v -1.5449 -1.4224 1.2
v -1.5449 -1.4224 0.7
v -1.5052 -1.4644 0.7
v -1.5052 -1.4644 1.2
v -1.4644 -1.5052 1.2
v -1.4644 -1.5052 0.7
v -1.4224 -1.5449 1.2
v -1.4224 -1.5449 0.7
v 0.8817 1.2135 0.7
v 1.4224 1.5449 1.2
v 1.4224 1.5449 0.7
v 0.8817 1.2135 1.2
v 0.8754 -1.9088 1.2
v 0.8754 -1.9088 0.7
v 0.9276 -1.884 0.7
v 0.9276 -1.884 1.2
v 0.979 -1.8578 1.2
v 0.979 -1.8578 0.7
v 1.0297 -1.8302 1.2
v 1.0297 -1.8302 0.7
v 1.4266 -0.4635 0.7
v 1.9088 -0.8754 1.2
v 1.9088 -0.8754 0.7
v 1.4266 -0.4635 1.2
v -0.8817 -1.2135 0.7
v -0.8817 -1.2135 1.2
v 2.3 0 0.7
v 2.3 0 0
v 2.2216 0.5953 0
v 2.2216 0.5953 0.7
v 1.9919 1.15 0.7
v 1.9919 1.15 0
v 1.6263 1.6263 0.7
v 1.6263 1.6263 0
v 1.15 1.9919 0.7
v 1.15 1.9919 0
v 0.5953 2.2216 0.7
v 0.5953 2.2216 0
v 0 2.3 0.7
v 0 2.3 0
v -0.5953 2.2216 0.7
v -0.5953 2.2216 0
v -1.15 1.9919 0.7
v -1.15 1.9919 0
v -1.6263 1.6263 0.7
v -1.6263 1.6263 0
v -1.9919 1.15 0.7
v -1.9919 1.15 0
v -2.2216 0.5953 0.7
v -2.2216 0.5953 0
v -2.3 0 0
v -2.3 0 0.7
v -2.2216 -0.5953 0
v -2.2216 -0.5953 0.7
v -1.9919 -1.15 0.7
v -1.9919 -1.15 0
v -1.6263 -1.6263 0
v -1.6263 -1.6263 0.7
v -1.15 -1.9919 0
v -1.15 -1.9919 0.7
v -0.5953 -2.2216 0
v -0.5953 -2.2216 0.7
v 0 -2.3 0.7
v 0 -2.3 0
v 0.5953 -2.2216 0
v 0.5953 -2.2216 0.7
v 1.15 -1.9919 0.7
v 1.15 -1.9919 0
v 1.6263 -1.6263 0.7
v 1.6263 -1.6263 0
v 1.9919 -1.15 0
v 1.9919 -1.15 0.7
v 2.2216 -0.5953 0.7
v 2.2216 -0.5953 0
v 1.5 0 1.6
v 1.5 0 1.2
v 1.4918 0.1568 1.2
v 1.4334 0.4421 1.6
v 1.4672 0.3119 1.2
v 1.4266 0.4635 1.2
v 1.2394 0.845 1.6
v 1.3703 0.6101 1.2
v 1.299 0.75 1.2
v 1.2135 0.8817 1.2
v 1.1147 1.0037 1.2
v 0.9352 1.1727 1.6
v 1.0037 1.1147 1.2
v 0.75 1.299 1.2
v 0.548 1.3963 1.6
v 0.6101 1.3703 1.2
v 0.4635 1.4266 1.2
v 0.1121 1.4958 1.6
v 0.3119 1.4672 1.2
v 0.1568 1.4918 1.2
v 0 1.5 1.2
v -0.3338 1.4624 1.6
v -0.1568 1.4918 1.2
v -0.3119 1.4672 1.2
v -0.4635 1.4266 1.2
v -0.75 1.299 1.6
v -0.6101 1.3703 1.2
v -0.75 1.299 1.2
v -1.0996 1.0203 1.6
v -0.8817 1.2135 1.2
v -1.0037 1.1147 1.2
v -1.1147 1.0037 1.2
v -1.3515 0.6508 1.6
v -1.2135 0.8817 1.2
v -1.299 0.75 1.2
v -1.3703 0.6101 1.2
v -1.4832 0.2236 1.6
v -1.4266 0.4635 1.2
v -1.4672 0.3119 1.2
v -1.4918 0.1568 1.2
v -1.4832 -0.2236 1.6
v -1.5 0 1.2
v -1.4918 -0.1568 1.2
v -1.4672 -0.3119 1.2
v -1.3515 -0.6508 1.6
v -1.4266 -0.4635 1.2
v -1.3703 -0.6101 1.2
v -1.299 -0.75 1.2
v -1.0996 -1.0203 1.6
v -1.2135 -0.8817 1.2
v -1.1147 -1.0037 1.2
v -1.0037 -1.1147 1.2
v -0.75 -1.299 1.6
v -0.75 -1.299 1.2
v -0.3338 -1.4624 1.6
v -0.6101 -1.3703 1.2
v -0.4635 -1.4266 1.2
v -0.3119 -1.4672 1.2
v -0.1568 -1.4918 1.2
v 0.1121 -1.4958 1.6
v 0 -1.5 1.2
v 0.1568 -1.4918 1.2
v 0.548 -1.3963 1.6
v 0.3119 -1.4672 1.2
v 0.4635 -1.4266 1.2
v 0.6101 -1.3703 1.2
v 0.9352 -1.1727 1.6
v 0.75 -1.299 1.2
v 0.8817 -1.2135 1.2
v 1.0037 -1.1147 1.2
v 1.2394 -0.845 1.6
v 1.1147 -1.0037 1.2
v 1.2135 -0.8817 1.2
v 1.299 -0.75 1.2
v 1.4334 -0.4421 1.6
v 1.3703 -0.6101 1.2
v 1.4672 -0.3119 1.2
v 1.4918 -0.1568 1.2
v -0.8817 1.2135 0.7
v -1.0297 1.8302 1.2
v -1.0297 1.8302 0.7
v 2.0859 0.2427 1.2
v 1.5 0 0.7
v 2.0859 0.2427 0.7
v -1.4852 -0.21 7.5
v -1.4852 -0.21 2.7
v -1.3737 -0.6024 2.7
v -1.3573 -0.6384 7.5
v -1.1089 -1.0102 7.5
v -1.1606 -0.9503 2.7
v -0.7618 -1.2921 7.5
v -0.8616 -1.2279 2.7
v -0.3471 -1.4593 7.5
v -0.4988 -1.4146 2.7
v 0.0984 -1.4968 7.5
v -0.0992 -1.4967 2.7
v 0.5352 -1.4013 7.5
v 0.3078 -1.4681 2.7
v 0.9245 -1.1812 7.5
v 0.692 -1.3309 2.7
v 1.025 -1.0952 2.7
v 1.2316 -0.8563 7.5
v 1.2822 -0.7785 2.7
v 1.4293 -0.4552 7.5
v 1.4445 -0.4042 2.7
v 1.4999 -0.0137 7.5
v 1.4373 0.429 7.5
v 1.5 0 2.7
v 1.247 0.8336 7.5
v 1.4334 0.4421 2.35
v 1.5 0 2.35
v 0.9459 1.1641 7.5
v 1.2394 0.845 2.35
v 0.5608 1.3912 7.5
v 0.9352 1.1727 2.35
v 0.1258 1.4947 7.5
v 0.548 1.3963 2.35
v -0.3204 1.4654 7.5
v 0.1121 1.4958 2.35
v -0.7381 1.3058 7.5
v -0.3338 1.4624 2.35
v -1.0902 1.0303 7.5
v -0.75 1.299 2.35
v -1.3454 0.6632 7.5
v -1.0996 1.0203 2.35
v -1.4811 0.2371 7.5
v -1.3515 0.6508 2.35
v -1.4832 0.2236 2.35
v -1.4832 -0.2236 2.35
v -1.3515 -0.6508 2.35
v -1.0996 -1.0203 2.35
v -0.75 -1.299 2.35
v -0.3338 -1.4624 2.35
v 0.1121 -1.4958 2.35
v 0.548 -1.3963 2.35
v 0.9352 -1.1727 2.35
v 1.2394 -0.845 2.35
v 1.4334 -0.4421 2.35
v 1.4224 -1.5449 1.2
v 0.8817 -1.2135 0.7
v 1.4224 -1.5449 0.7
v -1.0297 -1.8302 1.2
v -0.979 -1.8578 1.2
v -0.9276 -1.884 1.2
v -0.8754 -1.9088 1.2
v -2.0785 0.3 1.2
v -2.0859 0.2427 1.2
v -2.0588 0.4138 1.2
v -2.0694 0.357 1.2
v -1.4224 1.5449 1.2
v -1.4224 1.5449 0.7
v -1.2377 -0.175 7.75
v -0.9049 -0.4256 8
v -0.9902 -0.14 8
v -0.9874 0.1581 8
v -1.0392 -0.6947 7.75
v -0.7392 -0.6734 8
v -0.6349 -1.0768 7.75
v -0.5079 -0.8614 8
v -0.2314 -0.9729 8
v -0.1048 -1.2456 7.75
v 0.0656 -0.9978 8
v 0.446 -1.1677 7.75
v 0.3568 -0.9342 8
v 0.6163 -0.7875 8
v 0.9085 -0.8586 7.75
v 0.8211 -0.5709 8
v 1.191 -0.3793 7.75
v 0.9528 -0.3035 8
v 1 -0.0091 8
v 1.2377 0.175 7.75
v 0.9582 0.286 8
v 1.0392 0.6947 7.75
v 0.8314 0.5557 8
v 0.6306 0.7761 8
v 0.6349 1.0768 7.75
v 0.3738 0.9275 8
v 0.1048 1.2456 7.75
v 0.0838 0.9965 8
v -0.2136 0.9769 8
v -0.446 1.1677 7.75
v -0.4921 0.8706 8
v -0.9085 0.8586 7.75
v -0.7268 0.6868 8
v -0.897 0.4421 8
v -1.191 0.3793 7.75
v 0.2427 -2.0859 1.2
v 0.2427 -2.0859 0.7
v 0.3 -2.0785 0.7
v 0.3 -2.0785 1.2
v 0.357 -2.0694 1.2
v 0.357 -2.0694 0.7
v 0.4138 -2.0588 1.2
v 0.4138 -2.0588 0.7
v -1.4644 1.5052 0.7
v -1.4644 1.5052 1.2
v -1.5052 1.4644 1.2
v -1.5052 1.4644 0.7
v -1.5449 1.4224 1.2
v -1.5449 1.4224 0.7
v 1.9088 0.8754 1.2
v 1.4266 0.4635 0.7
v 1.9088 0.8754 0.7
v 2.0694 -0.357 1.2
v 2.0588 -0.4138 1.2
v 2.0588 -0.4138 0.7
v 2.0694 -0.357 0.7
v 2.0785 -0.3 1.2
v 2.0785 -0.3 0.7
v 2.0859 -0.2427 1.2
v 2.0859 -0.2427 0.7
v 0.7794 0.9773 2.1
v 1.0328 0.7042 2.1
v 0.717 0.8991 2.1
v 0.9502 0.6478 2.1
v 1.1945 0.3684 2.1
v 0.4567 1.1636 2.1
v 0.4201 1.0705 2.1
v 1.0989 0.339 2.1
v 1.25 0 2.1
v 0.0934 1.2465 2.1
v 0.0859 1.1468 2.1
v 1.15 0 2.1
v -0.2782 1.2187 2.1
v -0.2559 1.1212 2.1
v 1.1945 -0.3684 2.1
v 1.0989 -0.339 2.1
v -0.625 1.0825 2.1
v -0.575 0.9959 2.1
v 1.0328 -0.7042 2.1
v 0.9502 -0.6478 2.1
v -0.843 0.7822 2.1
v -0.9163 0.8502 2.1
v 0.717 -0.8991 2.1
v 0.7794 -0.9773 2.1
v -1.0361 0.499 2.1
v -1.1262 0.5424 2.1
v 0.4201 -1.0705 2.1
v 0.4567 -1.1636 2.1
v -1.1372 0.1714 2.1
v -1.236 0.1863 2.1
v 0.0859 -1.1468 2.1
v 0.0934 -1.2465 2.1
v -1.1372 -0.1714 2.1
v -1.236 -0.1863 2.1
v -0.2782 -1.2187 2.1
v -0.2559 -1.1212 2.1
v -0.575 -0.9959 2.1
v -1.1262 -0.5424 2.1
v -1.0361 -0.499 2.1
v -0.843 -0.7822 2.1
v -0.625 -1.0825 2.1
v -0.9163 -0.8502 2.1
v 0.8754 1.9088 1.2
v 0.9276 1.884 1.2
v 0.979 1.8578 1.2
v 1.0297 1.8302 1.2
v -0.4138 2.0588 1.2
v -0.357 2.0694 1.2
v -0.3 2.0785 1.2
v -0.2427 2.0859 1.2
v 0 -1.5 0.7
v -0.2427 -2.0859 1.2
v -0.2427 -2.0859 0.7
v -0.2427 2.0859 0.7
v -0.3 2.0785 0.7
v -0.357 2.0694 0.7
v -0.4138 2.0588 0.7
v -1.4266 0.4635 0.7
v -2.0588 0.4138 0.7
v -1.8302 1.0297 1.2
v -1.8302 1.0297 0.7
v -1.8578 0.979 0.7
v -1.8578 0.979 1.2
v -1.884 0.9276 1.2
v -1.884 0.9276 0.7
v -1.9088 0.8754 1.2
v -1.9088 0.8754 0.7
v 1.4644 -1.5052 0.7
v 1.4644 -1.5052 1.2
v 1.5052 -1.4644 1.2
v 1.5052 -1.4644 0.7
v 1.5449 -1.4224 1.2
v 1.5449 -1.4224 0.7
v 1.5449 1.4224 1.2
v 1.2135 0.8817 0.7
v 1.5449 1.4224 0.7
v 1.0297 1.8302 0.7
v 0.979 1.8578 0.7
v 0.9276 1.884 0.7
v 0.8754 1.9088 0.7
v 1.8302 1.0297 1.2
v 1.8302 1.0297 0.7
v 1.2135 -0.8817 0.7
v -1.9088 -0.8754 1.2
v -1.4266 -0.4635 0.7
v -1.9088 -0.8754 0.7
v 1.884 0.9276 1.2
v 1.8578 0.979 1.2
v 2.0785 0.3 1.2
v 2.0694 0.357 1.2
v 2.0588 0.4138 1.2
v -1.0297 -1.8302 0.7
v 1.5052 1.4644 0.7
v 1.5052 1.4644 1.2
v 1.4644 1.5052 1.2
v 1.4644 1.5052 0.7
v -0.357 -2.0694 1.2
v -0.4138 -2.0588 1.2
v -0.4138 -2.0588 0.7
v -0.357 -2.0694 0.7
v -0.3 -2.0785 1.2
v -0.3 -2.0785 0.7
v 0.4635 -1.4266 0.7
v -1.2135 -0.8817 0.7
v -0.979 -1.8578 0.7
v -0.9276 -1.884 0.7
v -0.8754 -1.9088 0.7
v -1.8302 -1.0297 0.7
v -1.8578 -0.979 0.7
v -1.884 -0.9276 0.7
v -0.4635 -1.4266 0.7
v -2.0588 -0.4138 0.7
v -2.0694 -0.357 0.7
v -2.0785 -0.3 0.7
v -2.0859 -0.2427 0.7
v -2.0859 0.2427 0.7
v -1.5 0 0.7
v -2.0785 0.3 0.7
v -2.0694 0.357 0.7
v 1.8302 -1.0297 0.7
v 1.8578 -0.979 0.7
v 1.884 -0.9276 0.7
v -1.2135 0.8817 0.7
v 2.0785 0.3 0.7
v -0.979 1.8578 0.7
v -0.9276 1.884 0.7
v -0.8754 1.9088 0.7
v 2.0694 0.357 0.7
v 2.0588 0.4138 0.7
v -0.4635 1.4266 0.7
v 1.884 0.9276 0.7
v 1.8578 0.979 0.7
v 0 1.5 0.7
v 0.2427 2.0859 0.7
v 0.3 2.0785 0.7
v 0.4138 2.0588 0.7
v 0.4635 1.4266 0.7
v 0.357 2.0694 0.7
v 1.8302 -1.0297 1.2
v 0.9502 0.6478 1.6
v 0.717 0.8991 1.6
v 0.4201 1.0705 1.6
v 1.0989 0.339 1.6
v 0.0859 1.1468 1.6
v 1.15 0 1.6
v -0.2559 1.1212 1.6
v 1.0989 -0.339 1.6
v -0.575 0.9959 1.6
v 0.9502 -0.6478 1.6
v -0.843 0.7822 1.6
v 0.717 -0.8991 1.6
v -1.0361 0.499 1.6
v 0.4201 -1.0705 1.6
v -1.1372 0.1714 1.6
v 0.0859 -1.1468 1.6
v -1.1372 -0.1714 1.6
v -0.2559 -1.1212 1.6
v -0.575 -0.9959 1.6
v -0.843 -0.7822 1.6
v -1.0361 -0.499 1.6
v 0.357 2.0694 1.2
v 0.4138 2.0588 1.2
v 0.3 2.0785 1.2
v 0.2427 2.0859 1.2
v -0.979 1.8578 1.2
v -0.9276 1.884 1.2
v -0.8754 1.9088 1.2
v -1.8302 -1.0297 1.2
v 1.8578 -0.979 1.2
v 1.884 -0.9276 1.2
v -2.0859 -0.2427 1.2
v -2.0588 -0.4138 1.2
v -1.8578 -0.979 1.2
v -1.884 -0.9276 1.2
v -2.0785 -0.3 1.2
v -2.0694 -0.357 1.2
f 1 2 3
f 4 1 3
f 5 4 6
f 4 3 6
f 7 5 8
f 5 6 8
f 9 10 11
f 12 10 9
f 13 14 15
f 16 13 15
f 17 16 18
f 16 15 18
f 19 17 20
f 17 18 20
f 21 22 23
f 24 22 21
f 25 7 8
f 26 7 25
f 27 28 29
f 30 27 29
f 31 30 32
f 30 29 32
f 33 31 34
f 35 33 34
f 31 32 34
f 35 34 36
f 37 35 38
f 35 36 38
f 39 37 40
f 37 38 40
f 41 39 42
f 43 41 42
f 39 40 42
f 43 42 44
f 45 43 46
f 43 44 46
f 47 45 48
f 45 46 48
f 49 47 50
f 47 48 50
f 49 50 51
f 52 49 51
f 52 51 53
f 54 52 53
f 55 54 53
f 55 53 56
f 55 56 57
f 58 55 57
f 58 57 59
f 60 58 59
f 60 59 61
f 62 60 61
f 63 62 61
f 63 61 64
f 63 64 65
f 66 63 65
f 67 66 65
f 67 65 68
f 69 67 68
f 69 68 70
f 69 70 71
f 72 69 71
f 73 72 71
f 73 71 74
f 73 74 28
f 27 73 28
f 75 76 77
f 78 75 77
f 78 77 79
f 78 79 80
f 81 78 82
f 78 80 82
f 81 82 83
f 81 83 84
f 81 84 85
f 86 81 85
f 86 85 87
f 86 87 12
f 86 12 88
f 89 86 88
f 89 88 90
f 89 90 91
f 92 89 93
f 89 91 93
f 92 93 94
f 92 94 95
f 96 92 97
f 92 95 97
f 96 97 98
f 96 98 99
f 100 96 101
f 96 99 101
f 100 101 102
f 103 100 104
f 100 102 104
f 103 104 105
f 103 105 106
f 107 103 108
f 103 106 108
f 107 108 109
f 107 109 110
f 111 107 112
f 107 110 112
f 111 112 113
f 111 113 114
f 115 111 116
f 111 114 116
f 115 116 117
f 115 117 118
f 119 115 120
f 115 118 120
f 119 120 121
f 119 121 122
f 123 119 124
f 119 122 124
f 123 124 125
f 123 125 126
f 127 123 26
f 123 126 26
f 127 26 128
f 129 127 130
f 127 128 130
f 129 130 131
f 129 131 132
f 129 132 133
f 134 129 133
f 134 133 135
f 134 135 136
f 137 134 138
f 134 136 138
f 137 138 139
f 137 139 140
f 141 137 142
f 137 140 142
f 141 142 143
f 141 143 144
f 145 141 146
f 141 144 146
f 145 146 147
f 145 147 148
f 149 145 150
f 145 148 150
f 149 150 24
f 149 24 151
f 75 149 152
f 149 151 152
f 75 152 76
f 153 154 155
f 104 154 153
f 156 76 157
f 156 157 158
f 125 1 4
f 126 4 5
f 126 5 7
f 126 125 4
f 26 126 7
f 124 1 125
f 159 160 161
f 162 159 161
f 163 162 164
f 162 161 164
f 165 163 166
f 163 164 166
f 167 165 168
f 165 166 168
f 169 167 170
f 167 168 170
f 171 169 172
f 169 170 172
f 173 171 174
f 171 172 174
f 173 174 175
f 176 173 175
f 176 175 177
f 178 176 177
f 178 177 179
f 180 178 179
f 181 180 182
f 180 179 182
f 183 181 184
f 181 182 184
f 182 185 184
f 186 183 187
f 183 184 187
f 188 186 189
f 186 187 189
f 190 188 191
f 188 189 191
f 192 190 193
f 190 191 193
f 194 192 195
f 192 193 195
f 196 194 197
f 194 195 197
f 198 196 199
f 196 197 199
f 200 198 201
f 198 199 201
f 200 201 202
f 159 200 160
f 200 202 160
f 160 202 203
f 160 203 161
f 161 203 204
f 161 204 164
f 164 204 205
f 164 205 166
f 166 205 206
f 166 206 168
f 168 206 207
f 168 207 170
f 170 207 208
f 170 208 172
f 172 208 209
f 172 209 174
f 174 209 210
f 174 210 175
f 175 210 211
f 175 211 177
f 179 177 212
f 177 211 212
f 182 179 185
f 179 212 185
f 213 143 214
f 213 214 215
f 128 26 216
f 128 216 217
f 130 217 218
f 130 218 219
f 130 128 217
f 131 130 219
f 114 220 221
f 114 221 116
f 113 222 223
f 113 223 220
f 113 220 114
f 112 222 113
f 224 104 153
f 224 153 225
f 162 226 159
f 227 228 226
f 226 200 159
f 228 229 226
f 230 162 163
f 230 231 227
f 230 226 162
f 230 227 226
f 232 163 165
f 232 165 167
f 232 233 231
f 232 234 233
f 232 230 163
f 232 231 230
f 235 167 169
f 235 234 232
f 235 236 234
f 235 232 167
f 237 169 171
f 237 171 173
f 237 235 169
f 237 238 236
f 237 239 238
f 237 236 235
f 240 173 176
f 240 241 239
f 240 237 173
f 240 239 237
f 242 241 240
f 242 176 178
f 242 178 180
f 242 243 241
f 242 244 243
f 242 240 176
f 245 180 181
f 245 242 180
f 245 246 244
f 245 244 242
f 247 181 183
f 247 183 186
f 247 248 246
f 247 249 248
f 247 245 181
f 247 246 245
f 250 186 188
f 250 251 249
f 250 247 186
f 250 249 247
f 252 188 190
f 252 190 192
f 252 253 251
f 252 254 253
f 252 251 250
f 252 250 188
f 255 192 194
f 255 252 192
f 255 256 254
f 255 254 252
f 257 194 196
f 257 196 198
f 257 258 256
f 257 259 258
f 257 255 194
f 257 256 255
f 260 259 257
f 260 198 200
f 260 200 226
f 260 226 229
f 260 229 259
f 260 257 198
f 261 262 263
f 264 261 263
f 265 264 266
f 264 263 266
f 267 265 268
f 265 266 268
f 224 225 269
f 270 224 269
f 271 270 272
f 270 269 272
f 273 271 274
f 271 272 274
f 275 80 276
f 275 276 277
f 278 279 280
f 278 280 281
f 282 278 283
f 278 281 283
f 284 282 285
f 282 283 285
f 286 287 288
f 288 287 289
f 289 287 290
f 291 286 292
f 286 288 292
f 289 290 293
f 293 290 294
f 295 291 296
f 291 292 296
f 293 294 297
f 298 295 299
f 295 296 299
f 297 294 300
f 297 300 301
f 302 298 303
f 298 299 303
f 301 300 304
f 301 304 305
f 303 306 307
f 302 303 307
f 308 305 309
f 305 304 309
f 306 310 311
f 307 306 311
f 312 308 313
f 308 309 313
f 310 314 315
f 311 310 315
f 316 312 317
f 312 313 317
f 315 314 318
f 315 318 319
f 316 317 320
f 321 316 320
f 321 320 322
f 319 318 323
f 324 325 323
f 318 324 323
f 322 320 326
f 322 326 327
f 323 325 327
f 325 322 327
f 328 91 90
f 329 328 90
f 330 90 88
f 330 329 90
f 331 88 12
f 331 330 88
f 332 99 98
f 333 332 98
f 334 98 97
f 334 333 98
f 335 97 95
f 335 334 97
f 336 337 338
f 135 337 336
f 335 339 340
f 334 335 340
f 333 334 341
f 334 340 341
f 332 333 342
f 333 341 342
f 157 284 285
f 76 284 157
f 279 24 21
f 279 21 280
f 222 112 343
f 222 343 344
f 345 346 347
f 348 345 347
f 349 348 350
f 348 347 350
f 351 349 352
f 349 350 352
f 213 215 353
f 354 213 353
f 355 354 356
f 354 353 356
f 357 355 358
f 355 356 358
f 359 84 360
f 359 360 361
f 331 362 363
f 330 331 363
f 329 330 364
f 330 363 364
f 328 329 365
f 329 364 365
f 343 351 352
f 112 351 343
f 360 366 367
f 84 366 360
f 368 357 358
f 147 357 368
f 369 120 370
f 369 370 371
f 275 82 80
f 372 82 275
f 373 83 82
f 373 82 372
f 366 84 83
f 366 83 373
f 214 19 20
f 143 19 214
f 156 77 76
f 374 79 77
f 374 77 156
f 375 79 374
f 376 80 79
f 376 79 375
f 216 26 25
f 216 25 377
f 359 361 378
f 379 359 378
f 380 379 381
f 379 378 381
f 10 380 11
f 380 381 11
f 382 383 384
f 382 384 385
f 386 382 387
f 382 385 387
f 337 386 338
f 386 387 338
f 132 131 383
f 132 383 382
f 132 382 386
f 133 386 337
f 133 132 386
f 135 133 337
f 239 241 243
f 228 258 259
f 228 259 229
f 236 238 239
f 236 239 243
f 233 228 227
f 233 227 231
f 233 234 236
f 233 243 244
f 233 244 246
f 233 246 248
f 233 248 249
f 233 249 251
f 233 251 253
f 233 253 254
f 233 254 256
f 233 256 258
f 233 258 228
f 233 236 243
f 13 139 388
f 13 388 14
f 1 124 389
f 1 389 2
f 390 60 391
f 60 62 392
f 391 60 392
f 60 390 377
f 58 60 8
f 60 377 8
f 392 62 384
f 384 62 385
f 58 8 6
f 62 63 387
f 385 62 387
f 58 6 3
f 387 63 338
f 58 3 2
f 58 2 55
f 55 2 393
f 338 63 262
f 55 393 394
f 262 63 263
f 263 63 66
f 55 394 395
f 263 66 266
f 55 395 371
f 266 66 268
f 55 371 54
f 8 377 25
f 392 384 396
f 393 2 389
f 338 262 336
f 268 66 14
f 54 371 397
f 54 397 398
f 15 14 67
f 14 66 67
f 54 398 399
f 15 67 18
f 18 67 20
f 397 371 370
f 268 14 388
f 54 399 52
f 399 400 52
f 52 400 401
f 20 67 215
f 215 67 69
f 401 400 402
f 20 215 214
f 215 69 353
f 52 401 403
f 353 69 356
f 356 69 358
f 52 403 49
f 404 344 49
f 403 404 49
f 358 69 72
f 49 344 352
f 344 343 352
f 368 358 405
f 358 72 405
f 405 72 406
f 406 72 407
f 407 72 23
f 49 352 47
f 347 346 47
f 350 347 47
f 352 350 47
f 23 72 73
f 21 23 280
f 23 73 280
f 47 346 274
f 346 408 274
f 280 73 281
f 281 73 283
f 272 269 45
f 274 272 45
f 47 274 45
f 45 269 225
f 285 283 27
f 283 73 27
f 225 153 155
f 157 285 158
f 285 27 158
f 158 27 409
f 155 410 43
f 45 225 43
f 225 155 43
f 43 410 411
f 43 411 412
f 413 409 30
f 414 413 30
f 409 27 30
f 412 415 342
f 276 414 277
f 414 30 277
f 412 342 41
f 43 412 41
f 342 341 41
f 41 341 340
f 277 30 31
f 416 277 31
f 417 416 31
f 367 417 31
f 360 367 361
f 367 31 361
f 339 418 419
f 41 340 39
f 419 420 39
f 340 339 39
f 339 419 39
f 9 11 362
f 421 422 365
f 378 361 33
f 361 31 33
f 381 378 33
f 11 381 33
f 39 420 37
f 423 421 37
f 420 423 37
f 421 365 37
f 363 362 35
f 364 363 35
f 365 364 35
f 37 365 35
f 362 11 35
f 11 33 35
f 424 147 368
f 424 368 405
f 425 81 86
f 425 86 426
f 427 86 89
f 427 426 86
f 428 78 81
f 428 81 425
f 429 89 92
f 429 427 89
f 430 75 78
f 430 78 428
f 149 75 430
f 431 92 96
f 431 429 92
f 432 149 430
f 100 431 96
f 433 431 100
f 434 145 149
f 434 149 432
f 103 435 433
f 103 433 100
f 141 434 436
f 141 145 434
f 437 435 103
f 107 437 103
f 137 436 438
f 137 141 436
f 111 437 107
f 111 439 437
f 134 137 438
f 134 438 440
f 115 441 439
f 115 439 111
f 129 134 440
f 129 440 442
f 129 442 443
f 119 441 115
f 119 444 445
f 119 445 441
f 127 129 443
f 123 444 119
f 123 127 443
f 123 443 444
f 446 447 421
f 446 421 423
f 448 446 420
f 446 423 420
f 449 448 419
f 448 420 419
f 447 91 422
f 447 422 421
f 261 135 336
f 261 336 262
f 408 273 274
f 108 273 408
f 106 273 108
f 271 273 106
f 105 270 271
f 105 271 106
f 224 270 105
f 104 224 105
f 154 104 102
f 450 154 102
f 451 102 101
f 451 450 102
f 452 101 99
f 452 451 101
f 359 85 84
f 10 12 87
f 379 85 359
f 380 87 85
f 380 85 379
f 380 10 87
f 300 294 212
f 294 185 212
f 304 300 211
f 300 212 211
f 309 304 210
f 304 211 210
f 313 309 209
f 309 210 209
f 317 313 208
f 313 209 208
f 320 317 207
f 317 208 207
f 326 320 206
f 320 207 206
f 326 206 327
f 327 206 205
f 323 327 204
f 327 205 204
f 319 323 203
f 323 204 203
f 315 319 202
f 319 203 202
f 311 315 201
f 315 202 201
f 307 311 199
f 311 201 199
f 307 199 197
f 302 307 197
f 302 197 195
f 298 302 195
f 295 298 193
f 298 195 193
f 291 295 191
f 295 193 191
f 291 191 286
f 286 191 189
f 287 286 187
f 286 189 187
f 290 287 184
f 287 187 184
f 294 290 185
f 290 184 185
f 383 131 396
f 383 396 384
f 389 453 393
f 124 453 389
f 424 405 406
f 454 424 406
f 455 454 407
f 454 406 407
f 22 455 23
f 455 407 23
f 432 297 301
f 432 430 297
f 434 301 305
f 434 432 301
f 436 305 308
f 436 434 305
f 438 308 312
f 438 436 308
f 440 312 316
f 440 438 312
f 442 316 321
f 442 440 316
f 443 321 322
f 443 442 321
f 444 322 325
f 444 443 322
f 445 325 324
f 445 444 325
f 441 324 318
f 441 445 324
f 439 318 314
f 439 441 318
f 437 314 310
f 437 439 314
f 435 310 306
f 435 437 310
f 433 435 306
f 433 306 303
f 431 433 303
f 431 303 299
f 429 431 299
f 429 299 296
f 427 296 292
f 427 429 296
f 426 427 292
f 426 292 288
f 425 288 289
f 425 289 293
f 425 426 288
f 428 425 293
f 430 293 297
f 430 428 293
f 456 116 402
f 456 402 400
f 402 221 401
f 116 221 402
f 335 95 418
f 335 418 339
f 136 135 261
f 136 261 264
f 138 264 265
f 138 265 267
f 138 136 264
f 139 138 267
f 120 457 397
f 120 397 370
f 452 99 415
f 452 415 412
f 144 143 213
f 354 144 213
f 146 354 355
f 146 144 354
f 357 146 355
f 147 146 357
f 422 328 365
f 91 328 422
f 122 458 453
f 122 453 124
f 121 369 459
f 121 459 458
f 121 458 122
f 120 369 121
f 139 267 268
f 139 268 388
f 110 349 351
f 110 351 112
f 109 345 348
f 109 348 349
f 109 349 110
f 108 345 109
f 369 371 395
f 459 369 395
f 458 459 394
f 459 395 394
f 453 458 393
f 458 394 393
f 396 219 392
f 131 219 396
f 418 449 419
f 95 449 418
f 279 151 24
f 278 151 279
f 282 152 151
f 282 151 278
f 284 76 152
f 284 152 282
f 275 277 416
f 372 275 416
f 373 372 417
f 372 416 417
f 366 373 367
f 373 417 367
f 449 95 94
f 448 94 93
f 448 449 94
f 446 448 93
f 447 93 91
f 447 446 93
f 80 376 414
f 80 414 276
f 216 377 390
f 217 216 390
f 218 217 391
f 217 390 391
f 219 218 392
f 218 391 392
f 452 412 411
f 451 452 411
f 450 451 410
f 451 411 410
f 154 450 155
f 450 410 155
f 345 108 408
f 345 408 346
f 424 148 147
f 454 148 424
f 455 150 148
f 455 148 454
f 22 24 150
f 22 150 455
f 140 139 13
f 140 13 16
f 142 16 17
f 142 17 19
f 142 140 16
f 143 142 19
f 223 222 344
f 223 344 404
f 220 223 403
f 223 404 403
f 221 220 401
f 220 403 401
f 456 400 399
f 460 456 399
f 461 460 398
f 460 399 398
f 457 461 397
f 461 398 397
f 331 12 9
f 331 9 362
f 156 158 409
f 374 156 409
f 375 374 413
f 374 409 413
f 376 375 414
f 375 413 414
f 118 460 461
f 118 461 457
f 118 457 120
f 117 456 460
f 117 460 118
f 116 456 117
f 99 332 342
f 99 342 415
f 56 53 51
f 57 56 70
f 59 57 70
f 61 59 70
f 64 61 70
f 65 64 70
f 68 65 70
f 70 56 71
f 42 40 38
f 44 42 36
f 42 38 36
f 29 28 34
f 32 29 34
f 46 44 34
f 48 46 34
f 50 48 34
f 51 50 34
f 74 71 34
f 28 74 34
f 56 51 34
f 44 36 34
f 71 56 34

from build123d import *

# Parameters (mm, degrees)
SKETCH_1_R               = 2.3
EXTRUDE_1_DEPTH          = 1.2
SKETCH_2_R               = 1.5
EXTRUDE_2_DEPTH          = 1.5
CUT_EXTRUDE_1_DEPTH      = 0.5
PATTERN_CIRCULAR_1_COUNT = 20
SKETCH_4_W               = 0.35
SKETCH_4_H               = 0.5
SKETCH_6_W               = 5.3
SKETCH_6_H               = 1.5
CHAMFER_2_SIZE           = 0.5
CUT_EXTRUDE_START        = -0.5
SKETCH_7_R               = 2.3
SKETCH_7_R_2             = 2.1
CUT_EXTRUDE_2_DEPTH      = 0.5


with BuildPart() as part:
    # Эскиз1 → Вытянуть1 (new body)
    with BuildSketch(Plane.XY):
        Circle(SKETCH_1_R)
    extrude(amount=EXTRUDE_1_DEPTH)

    # Эскиз2 → Вытянуть2 (add)
    with BuildSketch(Plane.XY.offset(1.2)):
        Circle(SKETCH_2_R)
    extrude(amount=EXTRUDE_2_DEPTH)

    # Эскиз3 → Вырез-Вытянуть1 (cut)
    with BuildSketch(Plane.XY.offset(1.2)):
        Polygon((-0.33137085, 2.3), (0.33137085, 2.3), (0, 1.5), align=None)
    cut_extrude_1 = extrude(amount=-CUT_EXTRUDE_1_DEPTH, mode=Mode.SUBTRACT)

    # Круговой массив1: Вырез-Вытянуть1 ×20 about axis
    pattern_circular_1_axis = Axis((0, 0, 0), (0, 0, 1))
    for i in range(1, PATTERN_CIRCULAR_1_COUNT):
        add(cut_extrude_1.rotate(pattern_circular_1_axis, i * 360 / PATTERN_CIRCULAR_1_COUNT), mode=Mode.SUBTRACT)

    # Эскиз4 → Вырез-Повернуть1 (revolve, cut)
    with BuildSketch(Plane(origin=(0, 0, 0), x_dir=(1, 0, 0), z_dir=(0, 1, 0))):
        with Locations((1.325, -1.85)):
            Rectangle(SKETCH_4_W, SKETCH_4_H)
    revolve(axis=Axis((0, 0, 10.642619983), (0, 0, -1)), mode=Mode.SUBTRACT)

    # Эскиз6 → Повернуть1 (revolve)
    with BuildSketch(Plane(origin=(0, 0, 0), x_dir=(0, 0, -1), z_dir=(1, 0, 0)), mode=Mode.PRIVATE) as revolve_1_sk:
        with Locations((-5.35, -0.75)):
            Rectangle(SKETCH_6_W, SKETCH_6_H)
    revolve(revolve_1_sk.sketch.rotate(Axis((0, 0, 2.7), (0, 0, 1)), 278.047567557), axis=Axis((0, 0, 2.7), (0, 0, 1)))

    # Фаска2
    # the kernel refuses this chamfer: 0.5 mm, written as the material it takes off along each edge
    with BuildSketch(Plane(origin=(0, 0, 8), x_dir=(-0.9901521845161062, -0.1399951838385265, 0), z_dir=(-0.1399951838385265, 0.9901521845161062, 0))) as chamfer_2_piece_1:
        Polygon((1.5, -CHAMFER_2_SIZE), (1.5 - CHAMFER_2_SIZE, 0), (1.5, 0), align=None)
    revolve(axis=Axis((0, 0, 8), (0, 0, 1)), mode=Mode.SUBTRACT)

    # Эскиз7 → Вырез-Вытянуть2 (cut)
    with BuildSketch(Plane.XY.offset(1.2).offset(CUT_EXTRUDE_START)):
        with Locations(Location((0, 0, 0), (0, 0, 180))):
            Circle(SKETCH_7_R)
        Circle(SKETCH_7_R_2, mode=Mode.SUBTRACT)
    extrude(amount=CUT_EXTRUDE_2_DEPTH, mode=Mode.SUBTRACT)

    # Фаска3
    # the kernel refuses this chamfer: 0.25 mm, written as the material it takes off along each edge
    with BuildSketch(Plane(origin=(0, 0, 2.1), x_dir=(1, 0, 0), z_dir=(0, 1, 0))) as chamfer_3_piece_1:
        with BuildLine():
            Line((1.242928932, 0.007071068), (1.507071068, -0.257071068))
            Line((1.507071068, -0.257071068), (1.512071068, -0.257071068))
            ThreePointArc((1.512071068, -0.257071068), (1.505, -0.128535534), (1.505, 0))
            Line((1.505, 0), (1.5, 0.005))
            ThreePointArc((1.5, 0.005), (1.371464466, 0.005), (1.242928932, 0.012071068))
            Line((1.242928932, 0.012071068), (1.242928932, 0.007071068))
        make_face()
    revolve(axis=Axis((0, 0, 2.1), (0, 0, -1)), mode=Mode.SUBTRACT)


solid = part.part
